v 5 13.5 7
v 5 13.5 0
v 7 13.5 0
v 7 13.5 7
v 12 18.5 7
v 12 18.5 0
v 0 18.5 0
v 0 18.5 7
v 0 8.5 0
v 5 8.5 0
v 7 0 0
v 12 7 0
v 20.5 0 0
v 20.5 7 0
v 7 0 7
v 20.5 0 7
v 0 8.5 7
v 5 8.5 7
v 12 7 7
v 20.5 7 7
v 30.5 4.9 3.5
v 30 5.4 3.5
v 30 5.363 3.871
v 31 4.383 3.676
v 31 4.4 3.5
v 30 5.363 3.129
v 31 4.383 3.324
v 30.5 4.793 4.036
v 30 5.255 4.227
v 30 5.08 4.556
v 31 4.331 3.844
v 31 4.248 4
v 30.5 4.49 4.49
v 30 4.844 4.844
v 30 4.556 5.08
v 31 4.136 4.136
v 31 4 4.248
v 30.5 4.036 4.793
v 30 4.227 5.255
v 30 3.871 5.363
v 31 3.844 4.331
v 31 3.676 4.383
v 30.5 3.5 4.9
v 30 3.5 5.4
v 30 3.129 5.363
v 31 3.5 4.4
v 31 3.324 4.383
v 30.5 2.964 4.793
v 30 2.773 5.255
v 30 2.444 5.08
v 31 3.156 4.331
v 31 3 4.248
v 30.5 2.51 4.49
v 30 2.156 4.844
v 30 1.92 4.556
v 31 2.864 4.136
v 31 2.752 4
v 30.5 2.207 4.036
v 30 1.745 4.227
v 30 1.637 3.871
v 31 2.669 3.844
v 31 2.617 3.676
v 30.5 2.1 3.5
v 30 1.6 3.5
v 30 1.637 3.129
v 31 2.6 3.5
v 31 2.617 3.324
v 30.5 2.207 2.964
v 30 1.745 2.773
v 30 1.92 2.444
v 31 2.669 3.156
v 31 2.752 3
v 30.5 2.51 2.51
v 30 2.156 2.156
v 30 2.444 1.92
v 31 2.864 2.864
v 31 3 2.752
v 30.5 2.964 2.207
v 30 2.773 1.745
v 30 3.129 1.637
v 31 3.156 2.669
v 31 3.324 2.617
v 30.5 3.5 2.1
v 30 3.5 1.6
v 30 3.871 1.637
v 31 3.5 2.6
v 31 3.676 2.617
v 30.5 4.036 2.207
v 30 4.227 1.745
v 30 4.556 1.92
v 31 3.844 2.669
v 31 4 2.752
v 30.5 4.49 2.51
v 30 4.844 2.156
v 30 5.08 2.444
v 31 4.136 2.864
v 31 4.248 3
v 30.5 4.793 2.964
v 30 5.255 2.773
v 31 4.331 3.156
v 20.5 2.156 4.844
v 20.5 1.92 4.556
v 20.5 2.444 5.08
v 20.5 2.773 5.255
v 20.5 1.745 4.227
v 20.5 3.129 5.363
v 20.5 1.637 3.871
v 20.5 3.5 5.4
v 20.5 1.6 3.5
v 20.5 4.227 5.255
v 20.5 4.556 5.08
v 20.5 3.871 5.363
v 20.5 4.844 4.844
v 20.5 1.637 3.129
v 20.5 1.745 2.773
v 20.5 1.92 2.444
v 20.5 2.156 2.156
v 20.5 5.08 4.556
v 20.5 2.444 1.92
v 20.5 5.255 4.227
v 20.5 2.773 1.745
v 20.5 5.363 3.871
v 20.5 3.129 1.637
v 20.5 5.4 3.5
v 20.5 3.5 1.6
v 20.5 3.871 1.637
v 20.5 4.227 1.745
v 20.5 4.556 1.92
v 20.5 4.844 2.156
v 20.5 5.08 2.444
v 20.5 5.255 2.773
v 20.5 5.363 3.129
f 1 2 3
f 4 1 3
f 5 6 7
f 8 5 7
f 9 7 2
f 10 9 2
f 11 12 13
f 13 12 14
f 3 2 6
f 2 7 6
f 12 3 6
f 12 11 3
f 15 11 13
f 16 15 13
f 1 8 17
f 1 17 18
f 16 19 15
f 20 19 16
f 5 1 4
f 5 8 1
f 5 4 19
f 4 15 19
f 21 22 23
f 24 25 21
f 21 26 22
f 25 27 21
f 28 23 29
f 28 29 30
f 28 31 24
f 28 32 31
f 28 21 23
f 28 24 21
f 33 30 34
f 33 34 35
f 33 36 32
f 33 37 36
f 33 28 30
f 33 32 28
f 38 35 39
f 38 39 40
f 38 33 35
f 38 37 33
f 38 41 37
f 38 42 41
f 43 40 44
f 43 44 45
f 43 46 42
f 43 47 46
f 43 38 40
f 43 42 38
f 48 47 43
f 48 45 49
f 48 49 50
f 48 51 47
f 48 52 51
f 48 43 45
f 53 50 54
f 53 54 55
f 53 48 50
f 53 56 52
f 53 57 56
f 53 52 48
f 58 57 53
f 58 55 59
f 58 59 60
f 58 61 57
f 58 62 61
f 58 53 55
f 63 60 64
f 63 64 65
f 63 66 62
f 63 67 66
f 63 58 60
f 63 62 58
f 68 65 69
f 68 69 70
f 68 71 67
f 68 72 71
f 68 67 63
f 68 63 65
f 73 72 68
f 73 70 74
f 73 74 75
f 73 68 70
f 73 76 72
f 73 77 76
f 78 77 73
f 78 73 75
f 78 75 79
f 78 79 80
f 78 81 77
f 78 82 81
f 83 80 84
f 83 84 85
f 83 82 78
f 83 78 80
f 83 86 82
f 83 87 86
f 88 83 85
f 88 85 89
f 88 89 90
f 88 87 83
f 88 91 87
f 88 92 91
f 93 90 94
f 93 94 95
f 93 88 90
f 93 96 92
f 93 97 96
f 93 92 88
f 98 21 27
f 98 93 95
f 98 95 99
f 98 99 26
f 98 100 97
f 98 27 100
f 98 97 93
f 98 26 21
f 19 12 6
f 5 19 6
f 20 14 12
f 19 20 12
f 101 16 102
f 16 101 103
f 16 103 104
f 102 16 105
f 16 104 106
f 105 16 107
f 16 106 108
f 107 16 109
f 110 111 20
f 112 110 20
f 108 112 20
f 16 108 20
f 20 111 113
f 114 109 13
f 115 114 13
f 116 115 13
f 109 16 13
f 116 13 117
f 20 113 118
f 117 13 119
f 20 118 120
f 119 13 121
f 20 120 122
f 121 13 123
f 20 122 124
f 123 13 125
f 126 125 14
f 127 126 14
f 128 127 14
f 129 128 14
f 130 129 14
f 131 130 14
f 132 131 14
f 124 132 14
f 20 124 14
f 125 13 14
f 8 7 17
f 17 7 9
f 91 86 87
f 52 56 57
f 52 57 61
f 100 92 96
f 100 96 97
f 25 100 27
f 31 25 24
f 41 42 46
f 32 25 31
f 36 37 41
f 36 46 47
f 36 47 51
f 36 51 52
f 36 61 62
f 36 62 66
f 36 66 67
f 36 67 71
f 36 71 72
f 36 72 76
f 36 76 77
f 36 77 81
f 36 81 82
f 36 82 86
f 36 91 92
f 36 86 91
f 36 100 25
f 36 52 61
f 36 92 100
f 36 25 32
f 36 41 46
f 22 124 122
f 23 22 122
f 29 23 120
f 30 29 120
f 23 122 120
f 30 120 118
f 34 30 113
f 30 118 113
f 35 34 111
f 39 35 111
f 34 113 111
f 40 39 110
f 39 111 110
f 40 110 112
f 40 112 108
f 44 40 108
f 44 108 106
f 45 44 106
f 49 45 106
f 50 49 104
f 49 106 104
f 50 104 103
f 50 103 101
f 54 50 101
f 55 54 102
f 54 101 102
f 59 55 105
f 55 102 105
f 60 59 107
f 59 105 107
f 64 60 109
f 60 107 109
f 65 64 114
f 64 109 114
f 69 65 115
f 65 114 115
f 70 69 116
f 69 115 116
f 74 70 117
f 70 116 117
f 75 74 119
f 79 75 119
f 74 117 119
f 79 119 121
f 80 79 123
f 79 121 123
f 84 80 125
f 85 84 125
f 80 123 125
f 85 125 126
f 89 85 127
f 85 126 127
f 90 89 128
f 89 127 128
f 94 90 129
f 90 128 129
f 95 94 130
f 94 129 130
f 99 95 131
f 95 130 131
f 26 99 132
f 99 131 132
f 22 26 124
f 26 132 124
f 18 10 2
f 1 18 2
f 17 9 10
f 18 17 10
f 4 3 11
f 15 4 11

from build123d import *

# Parameters (mm, degrees)
F1_DEPTH = 7
F2_R     = 1.9
F3_DEPTH = 10.5
F4_SIZE  = 1


# Not quite as in the source:
# - a feature names something its author has since deleted; it is built from what else it names


with BuildPart() as f1:
    # F0 (on Top) → F1 (new body)
    with BuildSketch(Plane.XY):
        Polygon((0, 18.5), (0, 8.5), (5, 8.5), (5, 13.5), (7, 13.5), (7, 0), (20.5, 0), (20.5, 7), (12, 7), (12, 18.5), align=None)
    extrude(amount=F1_DEPTH)

    # F2 (on face) → F3 (join)
    with BuildSketch(Plane.YZ.offset(20.5)):
        with Locations((3.5, 3.5)):
            Circle(F2_R)
    extrude(amount=F3_DEPTH)

    # F4
    f4_edges = [f1.edges().sort_by_distance(p)[0] for p in [
        (31, 1.6, 3.5),
    ]]
    chamfer(f4_edges, length=F4_SIZE)


solid = f1.part
